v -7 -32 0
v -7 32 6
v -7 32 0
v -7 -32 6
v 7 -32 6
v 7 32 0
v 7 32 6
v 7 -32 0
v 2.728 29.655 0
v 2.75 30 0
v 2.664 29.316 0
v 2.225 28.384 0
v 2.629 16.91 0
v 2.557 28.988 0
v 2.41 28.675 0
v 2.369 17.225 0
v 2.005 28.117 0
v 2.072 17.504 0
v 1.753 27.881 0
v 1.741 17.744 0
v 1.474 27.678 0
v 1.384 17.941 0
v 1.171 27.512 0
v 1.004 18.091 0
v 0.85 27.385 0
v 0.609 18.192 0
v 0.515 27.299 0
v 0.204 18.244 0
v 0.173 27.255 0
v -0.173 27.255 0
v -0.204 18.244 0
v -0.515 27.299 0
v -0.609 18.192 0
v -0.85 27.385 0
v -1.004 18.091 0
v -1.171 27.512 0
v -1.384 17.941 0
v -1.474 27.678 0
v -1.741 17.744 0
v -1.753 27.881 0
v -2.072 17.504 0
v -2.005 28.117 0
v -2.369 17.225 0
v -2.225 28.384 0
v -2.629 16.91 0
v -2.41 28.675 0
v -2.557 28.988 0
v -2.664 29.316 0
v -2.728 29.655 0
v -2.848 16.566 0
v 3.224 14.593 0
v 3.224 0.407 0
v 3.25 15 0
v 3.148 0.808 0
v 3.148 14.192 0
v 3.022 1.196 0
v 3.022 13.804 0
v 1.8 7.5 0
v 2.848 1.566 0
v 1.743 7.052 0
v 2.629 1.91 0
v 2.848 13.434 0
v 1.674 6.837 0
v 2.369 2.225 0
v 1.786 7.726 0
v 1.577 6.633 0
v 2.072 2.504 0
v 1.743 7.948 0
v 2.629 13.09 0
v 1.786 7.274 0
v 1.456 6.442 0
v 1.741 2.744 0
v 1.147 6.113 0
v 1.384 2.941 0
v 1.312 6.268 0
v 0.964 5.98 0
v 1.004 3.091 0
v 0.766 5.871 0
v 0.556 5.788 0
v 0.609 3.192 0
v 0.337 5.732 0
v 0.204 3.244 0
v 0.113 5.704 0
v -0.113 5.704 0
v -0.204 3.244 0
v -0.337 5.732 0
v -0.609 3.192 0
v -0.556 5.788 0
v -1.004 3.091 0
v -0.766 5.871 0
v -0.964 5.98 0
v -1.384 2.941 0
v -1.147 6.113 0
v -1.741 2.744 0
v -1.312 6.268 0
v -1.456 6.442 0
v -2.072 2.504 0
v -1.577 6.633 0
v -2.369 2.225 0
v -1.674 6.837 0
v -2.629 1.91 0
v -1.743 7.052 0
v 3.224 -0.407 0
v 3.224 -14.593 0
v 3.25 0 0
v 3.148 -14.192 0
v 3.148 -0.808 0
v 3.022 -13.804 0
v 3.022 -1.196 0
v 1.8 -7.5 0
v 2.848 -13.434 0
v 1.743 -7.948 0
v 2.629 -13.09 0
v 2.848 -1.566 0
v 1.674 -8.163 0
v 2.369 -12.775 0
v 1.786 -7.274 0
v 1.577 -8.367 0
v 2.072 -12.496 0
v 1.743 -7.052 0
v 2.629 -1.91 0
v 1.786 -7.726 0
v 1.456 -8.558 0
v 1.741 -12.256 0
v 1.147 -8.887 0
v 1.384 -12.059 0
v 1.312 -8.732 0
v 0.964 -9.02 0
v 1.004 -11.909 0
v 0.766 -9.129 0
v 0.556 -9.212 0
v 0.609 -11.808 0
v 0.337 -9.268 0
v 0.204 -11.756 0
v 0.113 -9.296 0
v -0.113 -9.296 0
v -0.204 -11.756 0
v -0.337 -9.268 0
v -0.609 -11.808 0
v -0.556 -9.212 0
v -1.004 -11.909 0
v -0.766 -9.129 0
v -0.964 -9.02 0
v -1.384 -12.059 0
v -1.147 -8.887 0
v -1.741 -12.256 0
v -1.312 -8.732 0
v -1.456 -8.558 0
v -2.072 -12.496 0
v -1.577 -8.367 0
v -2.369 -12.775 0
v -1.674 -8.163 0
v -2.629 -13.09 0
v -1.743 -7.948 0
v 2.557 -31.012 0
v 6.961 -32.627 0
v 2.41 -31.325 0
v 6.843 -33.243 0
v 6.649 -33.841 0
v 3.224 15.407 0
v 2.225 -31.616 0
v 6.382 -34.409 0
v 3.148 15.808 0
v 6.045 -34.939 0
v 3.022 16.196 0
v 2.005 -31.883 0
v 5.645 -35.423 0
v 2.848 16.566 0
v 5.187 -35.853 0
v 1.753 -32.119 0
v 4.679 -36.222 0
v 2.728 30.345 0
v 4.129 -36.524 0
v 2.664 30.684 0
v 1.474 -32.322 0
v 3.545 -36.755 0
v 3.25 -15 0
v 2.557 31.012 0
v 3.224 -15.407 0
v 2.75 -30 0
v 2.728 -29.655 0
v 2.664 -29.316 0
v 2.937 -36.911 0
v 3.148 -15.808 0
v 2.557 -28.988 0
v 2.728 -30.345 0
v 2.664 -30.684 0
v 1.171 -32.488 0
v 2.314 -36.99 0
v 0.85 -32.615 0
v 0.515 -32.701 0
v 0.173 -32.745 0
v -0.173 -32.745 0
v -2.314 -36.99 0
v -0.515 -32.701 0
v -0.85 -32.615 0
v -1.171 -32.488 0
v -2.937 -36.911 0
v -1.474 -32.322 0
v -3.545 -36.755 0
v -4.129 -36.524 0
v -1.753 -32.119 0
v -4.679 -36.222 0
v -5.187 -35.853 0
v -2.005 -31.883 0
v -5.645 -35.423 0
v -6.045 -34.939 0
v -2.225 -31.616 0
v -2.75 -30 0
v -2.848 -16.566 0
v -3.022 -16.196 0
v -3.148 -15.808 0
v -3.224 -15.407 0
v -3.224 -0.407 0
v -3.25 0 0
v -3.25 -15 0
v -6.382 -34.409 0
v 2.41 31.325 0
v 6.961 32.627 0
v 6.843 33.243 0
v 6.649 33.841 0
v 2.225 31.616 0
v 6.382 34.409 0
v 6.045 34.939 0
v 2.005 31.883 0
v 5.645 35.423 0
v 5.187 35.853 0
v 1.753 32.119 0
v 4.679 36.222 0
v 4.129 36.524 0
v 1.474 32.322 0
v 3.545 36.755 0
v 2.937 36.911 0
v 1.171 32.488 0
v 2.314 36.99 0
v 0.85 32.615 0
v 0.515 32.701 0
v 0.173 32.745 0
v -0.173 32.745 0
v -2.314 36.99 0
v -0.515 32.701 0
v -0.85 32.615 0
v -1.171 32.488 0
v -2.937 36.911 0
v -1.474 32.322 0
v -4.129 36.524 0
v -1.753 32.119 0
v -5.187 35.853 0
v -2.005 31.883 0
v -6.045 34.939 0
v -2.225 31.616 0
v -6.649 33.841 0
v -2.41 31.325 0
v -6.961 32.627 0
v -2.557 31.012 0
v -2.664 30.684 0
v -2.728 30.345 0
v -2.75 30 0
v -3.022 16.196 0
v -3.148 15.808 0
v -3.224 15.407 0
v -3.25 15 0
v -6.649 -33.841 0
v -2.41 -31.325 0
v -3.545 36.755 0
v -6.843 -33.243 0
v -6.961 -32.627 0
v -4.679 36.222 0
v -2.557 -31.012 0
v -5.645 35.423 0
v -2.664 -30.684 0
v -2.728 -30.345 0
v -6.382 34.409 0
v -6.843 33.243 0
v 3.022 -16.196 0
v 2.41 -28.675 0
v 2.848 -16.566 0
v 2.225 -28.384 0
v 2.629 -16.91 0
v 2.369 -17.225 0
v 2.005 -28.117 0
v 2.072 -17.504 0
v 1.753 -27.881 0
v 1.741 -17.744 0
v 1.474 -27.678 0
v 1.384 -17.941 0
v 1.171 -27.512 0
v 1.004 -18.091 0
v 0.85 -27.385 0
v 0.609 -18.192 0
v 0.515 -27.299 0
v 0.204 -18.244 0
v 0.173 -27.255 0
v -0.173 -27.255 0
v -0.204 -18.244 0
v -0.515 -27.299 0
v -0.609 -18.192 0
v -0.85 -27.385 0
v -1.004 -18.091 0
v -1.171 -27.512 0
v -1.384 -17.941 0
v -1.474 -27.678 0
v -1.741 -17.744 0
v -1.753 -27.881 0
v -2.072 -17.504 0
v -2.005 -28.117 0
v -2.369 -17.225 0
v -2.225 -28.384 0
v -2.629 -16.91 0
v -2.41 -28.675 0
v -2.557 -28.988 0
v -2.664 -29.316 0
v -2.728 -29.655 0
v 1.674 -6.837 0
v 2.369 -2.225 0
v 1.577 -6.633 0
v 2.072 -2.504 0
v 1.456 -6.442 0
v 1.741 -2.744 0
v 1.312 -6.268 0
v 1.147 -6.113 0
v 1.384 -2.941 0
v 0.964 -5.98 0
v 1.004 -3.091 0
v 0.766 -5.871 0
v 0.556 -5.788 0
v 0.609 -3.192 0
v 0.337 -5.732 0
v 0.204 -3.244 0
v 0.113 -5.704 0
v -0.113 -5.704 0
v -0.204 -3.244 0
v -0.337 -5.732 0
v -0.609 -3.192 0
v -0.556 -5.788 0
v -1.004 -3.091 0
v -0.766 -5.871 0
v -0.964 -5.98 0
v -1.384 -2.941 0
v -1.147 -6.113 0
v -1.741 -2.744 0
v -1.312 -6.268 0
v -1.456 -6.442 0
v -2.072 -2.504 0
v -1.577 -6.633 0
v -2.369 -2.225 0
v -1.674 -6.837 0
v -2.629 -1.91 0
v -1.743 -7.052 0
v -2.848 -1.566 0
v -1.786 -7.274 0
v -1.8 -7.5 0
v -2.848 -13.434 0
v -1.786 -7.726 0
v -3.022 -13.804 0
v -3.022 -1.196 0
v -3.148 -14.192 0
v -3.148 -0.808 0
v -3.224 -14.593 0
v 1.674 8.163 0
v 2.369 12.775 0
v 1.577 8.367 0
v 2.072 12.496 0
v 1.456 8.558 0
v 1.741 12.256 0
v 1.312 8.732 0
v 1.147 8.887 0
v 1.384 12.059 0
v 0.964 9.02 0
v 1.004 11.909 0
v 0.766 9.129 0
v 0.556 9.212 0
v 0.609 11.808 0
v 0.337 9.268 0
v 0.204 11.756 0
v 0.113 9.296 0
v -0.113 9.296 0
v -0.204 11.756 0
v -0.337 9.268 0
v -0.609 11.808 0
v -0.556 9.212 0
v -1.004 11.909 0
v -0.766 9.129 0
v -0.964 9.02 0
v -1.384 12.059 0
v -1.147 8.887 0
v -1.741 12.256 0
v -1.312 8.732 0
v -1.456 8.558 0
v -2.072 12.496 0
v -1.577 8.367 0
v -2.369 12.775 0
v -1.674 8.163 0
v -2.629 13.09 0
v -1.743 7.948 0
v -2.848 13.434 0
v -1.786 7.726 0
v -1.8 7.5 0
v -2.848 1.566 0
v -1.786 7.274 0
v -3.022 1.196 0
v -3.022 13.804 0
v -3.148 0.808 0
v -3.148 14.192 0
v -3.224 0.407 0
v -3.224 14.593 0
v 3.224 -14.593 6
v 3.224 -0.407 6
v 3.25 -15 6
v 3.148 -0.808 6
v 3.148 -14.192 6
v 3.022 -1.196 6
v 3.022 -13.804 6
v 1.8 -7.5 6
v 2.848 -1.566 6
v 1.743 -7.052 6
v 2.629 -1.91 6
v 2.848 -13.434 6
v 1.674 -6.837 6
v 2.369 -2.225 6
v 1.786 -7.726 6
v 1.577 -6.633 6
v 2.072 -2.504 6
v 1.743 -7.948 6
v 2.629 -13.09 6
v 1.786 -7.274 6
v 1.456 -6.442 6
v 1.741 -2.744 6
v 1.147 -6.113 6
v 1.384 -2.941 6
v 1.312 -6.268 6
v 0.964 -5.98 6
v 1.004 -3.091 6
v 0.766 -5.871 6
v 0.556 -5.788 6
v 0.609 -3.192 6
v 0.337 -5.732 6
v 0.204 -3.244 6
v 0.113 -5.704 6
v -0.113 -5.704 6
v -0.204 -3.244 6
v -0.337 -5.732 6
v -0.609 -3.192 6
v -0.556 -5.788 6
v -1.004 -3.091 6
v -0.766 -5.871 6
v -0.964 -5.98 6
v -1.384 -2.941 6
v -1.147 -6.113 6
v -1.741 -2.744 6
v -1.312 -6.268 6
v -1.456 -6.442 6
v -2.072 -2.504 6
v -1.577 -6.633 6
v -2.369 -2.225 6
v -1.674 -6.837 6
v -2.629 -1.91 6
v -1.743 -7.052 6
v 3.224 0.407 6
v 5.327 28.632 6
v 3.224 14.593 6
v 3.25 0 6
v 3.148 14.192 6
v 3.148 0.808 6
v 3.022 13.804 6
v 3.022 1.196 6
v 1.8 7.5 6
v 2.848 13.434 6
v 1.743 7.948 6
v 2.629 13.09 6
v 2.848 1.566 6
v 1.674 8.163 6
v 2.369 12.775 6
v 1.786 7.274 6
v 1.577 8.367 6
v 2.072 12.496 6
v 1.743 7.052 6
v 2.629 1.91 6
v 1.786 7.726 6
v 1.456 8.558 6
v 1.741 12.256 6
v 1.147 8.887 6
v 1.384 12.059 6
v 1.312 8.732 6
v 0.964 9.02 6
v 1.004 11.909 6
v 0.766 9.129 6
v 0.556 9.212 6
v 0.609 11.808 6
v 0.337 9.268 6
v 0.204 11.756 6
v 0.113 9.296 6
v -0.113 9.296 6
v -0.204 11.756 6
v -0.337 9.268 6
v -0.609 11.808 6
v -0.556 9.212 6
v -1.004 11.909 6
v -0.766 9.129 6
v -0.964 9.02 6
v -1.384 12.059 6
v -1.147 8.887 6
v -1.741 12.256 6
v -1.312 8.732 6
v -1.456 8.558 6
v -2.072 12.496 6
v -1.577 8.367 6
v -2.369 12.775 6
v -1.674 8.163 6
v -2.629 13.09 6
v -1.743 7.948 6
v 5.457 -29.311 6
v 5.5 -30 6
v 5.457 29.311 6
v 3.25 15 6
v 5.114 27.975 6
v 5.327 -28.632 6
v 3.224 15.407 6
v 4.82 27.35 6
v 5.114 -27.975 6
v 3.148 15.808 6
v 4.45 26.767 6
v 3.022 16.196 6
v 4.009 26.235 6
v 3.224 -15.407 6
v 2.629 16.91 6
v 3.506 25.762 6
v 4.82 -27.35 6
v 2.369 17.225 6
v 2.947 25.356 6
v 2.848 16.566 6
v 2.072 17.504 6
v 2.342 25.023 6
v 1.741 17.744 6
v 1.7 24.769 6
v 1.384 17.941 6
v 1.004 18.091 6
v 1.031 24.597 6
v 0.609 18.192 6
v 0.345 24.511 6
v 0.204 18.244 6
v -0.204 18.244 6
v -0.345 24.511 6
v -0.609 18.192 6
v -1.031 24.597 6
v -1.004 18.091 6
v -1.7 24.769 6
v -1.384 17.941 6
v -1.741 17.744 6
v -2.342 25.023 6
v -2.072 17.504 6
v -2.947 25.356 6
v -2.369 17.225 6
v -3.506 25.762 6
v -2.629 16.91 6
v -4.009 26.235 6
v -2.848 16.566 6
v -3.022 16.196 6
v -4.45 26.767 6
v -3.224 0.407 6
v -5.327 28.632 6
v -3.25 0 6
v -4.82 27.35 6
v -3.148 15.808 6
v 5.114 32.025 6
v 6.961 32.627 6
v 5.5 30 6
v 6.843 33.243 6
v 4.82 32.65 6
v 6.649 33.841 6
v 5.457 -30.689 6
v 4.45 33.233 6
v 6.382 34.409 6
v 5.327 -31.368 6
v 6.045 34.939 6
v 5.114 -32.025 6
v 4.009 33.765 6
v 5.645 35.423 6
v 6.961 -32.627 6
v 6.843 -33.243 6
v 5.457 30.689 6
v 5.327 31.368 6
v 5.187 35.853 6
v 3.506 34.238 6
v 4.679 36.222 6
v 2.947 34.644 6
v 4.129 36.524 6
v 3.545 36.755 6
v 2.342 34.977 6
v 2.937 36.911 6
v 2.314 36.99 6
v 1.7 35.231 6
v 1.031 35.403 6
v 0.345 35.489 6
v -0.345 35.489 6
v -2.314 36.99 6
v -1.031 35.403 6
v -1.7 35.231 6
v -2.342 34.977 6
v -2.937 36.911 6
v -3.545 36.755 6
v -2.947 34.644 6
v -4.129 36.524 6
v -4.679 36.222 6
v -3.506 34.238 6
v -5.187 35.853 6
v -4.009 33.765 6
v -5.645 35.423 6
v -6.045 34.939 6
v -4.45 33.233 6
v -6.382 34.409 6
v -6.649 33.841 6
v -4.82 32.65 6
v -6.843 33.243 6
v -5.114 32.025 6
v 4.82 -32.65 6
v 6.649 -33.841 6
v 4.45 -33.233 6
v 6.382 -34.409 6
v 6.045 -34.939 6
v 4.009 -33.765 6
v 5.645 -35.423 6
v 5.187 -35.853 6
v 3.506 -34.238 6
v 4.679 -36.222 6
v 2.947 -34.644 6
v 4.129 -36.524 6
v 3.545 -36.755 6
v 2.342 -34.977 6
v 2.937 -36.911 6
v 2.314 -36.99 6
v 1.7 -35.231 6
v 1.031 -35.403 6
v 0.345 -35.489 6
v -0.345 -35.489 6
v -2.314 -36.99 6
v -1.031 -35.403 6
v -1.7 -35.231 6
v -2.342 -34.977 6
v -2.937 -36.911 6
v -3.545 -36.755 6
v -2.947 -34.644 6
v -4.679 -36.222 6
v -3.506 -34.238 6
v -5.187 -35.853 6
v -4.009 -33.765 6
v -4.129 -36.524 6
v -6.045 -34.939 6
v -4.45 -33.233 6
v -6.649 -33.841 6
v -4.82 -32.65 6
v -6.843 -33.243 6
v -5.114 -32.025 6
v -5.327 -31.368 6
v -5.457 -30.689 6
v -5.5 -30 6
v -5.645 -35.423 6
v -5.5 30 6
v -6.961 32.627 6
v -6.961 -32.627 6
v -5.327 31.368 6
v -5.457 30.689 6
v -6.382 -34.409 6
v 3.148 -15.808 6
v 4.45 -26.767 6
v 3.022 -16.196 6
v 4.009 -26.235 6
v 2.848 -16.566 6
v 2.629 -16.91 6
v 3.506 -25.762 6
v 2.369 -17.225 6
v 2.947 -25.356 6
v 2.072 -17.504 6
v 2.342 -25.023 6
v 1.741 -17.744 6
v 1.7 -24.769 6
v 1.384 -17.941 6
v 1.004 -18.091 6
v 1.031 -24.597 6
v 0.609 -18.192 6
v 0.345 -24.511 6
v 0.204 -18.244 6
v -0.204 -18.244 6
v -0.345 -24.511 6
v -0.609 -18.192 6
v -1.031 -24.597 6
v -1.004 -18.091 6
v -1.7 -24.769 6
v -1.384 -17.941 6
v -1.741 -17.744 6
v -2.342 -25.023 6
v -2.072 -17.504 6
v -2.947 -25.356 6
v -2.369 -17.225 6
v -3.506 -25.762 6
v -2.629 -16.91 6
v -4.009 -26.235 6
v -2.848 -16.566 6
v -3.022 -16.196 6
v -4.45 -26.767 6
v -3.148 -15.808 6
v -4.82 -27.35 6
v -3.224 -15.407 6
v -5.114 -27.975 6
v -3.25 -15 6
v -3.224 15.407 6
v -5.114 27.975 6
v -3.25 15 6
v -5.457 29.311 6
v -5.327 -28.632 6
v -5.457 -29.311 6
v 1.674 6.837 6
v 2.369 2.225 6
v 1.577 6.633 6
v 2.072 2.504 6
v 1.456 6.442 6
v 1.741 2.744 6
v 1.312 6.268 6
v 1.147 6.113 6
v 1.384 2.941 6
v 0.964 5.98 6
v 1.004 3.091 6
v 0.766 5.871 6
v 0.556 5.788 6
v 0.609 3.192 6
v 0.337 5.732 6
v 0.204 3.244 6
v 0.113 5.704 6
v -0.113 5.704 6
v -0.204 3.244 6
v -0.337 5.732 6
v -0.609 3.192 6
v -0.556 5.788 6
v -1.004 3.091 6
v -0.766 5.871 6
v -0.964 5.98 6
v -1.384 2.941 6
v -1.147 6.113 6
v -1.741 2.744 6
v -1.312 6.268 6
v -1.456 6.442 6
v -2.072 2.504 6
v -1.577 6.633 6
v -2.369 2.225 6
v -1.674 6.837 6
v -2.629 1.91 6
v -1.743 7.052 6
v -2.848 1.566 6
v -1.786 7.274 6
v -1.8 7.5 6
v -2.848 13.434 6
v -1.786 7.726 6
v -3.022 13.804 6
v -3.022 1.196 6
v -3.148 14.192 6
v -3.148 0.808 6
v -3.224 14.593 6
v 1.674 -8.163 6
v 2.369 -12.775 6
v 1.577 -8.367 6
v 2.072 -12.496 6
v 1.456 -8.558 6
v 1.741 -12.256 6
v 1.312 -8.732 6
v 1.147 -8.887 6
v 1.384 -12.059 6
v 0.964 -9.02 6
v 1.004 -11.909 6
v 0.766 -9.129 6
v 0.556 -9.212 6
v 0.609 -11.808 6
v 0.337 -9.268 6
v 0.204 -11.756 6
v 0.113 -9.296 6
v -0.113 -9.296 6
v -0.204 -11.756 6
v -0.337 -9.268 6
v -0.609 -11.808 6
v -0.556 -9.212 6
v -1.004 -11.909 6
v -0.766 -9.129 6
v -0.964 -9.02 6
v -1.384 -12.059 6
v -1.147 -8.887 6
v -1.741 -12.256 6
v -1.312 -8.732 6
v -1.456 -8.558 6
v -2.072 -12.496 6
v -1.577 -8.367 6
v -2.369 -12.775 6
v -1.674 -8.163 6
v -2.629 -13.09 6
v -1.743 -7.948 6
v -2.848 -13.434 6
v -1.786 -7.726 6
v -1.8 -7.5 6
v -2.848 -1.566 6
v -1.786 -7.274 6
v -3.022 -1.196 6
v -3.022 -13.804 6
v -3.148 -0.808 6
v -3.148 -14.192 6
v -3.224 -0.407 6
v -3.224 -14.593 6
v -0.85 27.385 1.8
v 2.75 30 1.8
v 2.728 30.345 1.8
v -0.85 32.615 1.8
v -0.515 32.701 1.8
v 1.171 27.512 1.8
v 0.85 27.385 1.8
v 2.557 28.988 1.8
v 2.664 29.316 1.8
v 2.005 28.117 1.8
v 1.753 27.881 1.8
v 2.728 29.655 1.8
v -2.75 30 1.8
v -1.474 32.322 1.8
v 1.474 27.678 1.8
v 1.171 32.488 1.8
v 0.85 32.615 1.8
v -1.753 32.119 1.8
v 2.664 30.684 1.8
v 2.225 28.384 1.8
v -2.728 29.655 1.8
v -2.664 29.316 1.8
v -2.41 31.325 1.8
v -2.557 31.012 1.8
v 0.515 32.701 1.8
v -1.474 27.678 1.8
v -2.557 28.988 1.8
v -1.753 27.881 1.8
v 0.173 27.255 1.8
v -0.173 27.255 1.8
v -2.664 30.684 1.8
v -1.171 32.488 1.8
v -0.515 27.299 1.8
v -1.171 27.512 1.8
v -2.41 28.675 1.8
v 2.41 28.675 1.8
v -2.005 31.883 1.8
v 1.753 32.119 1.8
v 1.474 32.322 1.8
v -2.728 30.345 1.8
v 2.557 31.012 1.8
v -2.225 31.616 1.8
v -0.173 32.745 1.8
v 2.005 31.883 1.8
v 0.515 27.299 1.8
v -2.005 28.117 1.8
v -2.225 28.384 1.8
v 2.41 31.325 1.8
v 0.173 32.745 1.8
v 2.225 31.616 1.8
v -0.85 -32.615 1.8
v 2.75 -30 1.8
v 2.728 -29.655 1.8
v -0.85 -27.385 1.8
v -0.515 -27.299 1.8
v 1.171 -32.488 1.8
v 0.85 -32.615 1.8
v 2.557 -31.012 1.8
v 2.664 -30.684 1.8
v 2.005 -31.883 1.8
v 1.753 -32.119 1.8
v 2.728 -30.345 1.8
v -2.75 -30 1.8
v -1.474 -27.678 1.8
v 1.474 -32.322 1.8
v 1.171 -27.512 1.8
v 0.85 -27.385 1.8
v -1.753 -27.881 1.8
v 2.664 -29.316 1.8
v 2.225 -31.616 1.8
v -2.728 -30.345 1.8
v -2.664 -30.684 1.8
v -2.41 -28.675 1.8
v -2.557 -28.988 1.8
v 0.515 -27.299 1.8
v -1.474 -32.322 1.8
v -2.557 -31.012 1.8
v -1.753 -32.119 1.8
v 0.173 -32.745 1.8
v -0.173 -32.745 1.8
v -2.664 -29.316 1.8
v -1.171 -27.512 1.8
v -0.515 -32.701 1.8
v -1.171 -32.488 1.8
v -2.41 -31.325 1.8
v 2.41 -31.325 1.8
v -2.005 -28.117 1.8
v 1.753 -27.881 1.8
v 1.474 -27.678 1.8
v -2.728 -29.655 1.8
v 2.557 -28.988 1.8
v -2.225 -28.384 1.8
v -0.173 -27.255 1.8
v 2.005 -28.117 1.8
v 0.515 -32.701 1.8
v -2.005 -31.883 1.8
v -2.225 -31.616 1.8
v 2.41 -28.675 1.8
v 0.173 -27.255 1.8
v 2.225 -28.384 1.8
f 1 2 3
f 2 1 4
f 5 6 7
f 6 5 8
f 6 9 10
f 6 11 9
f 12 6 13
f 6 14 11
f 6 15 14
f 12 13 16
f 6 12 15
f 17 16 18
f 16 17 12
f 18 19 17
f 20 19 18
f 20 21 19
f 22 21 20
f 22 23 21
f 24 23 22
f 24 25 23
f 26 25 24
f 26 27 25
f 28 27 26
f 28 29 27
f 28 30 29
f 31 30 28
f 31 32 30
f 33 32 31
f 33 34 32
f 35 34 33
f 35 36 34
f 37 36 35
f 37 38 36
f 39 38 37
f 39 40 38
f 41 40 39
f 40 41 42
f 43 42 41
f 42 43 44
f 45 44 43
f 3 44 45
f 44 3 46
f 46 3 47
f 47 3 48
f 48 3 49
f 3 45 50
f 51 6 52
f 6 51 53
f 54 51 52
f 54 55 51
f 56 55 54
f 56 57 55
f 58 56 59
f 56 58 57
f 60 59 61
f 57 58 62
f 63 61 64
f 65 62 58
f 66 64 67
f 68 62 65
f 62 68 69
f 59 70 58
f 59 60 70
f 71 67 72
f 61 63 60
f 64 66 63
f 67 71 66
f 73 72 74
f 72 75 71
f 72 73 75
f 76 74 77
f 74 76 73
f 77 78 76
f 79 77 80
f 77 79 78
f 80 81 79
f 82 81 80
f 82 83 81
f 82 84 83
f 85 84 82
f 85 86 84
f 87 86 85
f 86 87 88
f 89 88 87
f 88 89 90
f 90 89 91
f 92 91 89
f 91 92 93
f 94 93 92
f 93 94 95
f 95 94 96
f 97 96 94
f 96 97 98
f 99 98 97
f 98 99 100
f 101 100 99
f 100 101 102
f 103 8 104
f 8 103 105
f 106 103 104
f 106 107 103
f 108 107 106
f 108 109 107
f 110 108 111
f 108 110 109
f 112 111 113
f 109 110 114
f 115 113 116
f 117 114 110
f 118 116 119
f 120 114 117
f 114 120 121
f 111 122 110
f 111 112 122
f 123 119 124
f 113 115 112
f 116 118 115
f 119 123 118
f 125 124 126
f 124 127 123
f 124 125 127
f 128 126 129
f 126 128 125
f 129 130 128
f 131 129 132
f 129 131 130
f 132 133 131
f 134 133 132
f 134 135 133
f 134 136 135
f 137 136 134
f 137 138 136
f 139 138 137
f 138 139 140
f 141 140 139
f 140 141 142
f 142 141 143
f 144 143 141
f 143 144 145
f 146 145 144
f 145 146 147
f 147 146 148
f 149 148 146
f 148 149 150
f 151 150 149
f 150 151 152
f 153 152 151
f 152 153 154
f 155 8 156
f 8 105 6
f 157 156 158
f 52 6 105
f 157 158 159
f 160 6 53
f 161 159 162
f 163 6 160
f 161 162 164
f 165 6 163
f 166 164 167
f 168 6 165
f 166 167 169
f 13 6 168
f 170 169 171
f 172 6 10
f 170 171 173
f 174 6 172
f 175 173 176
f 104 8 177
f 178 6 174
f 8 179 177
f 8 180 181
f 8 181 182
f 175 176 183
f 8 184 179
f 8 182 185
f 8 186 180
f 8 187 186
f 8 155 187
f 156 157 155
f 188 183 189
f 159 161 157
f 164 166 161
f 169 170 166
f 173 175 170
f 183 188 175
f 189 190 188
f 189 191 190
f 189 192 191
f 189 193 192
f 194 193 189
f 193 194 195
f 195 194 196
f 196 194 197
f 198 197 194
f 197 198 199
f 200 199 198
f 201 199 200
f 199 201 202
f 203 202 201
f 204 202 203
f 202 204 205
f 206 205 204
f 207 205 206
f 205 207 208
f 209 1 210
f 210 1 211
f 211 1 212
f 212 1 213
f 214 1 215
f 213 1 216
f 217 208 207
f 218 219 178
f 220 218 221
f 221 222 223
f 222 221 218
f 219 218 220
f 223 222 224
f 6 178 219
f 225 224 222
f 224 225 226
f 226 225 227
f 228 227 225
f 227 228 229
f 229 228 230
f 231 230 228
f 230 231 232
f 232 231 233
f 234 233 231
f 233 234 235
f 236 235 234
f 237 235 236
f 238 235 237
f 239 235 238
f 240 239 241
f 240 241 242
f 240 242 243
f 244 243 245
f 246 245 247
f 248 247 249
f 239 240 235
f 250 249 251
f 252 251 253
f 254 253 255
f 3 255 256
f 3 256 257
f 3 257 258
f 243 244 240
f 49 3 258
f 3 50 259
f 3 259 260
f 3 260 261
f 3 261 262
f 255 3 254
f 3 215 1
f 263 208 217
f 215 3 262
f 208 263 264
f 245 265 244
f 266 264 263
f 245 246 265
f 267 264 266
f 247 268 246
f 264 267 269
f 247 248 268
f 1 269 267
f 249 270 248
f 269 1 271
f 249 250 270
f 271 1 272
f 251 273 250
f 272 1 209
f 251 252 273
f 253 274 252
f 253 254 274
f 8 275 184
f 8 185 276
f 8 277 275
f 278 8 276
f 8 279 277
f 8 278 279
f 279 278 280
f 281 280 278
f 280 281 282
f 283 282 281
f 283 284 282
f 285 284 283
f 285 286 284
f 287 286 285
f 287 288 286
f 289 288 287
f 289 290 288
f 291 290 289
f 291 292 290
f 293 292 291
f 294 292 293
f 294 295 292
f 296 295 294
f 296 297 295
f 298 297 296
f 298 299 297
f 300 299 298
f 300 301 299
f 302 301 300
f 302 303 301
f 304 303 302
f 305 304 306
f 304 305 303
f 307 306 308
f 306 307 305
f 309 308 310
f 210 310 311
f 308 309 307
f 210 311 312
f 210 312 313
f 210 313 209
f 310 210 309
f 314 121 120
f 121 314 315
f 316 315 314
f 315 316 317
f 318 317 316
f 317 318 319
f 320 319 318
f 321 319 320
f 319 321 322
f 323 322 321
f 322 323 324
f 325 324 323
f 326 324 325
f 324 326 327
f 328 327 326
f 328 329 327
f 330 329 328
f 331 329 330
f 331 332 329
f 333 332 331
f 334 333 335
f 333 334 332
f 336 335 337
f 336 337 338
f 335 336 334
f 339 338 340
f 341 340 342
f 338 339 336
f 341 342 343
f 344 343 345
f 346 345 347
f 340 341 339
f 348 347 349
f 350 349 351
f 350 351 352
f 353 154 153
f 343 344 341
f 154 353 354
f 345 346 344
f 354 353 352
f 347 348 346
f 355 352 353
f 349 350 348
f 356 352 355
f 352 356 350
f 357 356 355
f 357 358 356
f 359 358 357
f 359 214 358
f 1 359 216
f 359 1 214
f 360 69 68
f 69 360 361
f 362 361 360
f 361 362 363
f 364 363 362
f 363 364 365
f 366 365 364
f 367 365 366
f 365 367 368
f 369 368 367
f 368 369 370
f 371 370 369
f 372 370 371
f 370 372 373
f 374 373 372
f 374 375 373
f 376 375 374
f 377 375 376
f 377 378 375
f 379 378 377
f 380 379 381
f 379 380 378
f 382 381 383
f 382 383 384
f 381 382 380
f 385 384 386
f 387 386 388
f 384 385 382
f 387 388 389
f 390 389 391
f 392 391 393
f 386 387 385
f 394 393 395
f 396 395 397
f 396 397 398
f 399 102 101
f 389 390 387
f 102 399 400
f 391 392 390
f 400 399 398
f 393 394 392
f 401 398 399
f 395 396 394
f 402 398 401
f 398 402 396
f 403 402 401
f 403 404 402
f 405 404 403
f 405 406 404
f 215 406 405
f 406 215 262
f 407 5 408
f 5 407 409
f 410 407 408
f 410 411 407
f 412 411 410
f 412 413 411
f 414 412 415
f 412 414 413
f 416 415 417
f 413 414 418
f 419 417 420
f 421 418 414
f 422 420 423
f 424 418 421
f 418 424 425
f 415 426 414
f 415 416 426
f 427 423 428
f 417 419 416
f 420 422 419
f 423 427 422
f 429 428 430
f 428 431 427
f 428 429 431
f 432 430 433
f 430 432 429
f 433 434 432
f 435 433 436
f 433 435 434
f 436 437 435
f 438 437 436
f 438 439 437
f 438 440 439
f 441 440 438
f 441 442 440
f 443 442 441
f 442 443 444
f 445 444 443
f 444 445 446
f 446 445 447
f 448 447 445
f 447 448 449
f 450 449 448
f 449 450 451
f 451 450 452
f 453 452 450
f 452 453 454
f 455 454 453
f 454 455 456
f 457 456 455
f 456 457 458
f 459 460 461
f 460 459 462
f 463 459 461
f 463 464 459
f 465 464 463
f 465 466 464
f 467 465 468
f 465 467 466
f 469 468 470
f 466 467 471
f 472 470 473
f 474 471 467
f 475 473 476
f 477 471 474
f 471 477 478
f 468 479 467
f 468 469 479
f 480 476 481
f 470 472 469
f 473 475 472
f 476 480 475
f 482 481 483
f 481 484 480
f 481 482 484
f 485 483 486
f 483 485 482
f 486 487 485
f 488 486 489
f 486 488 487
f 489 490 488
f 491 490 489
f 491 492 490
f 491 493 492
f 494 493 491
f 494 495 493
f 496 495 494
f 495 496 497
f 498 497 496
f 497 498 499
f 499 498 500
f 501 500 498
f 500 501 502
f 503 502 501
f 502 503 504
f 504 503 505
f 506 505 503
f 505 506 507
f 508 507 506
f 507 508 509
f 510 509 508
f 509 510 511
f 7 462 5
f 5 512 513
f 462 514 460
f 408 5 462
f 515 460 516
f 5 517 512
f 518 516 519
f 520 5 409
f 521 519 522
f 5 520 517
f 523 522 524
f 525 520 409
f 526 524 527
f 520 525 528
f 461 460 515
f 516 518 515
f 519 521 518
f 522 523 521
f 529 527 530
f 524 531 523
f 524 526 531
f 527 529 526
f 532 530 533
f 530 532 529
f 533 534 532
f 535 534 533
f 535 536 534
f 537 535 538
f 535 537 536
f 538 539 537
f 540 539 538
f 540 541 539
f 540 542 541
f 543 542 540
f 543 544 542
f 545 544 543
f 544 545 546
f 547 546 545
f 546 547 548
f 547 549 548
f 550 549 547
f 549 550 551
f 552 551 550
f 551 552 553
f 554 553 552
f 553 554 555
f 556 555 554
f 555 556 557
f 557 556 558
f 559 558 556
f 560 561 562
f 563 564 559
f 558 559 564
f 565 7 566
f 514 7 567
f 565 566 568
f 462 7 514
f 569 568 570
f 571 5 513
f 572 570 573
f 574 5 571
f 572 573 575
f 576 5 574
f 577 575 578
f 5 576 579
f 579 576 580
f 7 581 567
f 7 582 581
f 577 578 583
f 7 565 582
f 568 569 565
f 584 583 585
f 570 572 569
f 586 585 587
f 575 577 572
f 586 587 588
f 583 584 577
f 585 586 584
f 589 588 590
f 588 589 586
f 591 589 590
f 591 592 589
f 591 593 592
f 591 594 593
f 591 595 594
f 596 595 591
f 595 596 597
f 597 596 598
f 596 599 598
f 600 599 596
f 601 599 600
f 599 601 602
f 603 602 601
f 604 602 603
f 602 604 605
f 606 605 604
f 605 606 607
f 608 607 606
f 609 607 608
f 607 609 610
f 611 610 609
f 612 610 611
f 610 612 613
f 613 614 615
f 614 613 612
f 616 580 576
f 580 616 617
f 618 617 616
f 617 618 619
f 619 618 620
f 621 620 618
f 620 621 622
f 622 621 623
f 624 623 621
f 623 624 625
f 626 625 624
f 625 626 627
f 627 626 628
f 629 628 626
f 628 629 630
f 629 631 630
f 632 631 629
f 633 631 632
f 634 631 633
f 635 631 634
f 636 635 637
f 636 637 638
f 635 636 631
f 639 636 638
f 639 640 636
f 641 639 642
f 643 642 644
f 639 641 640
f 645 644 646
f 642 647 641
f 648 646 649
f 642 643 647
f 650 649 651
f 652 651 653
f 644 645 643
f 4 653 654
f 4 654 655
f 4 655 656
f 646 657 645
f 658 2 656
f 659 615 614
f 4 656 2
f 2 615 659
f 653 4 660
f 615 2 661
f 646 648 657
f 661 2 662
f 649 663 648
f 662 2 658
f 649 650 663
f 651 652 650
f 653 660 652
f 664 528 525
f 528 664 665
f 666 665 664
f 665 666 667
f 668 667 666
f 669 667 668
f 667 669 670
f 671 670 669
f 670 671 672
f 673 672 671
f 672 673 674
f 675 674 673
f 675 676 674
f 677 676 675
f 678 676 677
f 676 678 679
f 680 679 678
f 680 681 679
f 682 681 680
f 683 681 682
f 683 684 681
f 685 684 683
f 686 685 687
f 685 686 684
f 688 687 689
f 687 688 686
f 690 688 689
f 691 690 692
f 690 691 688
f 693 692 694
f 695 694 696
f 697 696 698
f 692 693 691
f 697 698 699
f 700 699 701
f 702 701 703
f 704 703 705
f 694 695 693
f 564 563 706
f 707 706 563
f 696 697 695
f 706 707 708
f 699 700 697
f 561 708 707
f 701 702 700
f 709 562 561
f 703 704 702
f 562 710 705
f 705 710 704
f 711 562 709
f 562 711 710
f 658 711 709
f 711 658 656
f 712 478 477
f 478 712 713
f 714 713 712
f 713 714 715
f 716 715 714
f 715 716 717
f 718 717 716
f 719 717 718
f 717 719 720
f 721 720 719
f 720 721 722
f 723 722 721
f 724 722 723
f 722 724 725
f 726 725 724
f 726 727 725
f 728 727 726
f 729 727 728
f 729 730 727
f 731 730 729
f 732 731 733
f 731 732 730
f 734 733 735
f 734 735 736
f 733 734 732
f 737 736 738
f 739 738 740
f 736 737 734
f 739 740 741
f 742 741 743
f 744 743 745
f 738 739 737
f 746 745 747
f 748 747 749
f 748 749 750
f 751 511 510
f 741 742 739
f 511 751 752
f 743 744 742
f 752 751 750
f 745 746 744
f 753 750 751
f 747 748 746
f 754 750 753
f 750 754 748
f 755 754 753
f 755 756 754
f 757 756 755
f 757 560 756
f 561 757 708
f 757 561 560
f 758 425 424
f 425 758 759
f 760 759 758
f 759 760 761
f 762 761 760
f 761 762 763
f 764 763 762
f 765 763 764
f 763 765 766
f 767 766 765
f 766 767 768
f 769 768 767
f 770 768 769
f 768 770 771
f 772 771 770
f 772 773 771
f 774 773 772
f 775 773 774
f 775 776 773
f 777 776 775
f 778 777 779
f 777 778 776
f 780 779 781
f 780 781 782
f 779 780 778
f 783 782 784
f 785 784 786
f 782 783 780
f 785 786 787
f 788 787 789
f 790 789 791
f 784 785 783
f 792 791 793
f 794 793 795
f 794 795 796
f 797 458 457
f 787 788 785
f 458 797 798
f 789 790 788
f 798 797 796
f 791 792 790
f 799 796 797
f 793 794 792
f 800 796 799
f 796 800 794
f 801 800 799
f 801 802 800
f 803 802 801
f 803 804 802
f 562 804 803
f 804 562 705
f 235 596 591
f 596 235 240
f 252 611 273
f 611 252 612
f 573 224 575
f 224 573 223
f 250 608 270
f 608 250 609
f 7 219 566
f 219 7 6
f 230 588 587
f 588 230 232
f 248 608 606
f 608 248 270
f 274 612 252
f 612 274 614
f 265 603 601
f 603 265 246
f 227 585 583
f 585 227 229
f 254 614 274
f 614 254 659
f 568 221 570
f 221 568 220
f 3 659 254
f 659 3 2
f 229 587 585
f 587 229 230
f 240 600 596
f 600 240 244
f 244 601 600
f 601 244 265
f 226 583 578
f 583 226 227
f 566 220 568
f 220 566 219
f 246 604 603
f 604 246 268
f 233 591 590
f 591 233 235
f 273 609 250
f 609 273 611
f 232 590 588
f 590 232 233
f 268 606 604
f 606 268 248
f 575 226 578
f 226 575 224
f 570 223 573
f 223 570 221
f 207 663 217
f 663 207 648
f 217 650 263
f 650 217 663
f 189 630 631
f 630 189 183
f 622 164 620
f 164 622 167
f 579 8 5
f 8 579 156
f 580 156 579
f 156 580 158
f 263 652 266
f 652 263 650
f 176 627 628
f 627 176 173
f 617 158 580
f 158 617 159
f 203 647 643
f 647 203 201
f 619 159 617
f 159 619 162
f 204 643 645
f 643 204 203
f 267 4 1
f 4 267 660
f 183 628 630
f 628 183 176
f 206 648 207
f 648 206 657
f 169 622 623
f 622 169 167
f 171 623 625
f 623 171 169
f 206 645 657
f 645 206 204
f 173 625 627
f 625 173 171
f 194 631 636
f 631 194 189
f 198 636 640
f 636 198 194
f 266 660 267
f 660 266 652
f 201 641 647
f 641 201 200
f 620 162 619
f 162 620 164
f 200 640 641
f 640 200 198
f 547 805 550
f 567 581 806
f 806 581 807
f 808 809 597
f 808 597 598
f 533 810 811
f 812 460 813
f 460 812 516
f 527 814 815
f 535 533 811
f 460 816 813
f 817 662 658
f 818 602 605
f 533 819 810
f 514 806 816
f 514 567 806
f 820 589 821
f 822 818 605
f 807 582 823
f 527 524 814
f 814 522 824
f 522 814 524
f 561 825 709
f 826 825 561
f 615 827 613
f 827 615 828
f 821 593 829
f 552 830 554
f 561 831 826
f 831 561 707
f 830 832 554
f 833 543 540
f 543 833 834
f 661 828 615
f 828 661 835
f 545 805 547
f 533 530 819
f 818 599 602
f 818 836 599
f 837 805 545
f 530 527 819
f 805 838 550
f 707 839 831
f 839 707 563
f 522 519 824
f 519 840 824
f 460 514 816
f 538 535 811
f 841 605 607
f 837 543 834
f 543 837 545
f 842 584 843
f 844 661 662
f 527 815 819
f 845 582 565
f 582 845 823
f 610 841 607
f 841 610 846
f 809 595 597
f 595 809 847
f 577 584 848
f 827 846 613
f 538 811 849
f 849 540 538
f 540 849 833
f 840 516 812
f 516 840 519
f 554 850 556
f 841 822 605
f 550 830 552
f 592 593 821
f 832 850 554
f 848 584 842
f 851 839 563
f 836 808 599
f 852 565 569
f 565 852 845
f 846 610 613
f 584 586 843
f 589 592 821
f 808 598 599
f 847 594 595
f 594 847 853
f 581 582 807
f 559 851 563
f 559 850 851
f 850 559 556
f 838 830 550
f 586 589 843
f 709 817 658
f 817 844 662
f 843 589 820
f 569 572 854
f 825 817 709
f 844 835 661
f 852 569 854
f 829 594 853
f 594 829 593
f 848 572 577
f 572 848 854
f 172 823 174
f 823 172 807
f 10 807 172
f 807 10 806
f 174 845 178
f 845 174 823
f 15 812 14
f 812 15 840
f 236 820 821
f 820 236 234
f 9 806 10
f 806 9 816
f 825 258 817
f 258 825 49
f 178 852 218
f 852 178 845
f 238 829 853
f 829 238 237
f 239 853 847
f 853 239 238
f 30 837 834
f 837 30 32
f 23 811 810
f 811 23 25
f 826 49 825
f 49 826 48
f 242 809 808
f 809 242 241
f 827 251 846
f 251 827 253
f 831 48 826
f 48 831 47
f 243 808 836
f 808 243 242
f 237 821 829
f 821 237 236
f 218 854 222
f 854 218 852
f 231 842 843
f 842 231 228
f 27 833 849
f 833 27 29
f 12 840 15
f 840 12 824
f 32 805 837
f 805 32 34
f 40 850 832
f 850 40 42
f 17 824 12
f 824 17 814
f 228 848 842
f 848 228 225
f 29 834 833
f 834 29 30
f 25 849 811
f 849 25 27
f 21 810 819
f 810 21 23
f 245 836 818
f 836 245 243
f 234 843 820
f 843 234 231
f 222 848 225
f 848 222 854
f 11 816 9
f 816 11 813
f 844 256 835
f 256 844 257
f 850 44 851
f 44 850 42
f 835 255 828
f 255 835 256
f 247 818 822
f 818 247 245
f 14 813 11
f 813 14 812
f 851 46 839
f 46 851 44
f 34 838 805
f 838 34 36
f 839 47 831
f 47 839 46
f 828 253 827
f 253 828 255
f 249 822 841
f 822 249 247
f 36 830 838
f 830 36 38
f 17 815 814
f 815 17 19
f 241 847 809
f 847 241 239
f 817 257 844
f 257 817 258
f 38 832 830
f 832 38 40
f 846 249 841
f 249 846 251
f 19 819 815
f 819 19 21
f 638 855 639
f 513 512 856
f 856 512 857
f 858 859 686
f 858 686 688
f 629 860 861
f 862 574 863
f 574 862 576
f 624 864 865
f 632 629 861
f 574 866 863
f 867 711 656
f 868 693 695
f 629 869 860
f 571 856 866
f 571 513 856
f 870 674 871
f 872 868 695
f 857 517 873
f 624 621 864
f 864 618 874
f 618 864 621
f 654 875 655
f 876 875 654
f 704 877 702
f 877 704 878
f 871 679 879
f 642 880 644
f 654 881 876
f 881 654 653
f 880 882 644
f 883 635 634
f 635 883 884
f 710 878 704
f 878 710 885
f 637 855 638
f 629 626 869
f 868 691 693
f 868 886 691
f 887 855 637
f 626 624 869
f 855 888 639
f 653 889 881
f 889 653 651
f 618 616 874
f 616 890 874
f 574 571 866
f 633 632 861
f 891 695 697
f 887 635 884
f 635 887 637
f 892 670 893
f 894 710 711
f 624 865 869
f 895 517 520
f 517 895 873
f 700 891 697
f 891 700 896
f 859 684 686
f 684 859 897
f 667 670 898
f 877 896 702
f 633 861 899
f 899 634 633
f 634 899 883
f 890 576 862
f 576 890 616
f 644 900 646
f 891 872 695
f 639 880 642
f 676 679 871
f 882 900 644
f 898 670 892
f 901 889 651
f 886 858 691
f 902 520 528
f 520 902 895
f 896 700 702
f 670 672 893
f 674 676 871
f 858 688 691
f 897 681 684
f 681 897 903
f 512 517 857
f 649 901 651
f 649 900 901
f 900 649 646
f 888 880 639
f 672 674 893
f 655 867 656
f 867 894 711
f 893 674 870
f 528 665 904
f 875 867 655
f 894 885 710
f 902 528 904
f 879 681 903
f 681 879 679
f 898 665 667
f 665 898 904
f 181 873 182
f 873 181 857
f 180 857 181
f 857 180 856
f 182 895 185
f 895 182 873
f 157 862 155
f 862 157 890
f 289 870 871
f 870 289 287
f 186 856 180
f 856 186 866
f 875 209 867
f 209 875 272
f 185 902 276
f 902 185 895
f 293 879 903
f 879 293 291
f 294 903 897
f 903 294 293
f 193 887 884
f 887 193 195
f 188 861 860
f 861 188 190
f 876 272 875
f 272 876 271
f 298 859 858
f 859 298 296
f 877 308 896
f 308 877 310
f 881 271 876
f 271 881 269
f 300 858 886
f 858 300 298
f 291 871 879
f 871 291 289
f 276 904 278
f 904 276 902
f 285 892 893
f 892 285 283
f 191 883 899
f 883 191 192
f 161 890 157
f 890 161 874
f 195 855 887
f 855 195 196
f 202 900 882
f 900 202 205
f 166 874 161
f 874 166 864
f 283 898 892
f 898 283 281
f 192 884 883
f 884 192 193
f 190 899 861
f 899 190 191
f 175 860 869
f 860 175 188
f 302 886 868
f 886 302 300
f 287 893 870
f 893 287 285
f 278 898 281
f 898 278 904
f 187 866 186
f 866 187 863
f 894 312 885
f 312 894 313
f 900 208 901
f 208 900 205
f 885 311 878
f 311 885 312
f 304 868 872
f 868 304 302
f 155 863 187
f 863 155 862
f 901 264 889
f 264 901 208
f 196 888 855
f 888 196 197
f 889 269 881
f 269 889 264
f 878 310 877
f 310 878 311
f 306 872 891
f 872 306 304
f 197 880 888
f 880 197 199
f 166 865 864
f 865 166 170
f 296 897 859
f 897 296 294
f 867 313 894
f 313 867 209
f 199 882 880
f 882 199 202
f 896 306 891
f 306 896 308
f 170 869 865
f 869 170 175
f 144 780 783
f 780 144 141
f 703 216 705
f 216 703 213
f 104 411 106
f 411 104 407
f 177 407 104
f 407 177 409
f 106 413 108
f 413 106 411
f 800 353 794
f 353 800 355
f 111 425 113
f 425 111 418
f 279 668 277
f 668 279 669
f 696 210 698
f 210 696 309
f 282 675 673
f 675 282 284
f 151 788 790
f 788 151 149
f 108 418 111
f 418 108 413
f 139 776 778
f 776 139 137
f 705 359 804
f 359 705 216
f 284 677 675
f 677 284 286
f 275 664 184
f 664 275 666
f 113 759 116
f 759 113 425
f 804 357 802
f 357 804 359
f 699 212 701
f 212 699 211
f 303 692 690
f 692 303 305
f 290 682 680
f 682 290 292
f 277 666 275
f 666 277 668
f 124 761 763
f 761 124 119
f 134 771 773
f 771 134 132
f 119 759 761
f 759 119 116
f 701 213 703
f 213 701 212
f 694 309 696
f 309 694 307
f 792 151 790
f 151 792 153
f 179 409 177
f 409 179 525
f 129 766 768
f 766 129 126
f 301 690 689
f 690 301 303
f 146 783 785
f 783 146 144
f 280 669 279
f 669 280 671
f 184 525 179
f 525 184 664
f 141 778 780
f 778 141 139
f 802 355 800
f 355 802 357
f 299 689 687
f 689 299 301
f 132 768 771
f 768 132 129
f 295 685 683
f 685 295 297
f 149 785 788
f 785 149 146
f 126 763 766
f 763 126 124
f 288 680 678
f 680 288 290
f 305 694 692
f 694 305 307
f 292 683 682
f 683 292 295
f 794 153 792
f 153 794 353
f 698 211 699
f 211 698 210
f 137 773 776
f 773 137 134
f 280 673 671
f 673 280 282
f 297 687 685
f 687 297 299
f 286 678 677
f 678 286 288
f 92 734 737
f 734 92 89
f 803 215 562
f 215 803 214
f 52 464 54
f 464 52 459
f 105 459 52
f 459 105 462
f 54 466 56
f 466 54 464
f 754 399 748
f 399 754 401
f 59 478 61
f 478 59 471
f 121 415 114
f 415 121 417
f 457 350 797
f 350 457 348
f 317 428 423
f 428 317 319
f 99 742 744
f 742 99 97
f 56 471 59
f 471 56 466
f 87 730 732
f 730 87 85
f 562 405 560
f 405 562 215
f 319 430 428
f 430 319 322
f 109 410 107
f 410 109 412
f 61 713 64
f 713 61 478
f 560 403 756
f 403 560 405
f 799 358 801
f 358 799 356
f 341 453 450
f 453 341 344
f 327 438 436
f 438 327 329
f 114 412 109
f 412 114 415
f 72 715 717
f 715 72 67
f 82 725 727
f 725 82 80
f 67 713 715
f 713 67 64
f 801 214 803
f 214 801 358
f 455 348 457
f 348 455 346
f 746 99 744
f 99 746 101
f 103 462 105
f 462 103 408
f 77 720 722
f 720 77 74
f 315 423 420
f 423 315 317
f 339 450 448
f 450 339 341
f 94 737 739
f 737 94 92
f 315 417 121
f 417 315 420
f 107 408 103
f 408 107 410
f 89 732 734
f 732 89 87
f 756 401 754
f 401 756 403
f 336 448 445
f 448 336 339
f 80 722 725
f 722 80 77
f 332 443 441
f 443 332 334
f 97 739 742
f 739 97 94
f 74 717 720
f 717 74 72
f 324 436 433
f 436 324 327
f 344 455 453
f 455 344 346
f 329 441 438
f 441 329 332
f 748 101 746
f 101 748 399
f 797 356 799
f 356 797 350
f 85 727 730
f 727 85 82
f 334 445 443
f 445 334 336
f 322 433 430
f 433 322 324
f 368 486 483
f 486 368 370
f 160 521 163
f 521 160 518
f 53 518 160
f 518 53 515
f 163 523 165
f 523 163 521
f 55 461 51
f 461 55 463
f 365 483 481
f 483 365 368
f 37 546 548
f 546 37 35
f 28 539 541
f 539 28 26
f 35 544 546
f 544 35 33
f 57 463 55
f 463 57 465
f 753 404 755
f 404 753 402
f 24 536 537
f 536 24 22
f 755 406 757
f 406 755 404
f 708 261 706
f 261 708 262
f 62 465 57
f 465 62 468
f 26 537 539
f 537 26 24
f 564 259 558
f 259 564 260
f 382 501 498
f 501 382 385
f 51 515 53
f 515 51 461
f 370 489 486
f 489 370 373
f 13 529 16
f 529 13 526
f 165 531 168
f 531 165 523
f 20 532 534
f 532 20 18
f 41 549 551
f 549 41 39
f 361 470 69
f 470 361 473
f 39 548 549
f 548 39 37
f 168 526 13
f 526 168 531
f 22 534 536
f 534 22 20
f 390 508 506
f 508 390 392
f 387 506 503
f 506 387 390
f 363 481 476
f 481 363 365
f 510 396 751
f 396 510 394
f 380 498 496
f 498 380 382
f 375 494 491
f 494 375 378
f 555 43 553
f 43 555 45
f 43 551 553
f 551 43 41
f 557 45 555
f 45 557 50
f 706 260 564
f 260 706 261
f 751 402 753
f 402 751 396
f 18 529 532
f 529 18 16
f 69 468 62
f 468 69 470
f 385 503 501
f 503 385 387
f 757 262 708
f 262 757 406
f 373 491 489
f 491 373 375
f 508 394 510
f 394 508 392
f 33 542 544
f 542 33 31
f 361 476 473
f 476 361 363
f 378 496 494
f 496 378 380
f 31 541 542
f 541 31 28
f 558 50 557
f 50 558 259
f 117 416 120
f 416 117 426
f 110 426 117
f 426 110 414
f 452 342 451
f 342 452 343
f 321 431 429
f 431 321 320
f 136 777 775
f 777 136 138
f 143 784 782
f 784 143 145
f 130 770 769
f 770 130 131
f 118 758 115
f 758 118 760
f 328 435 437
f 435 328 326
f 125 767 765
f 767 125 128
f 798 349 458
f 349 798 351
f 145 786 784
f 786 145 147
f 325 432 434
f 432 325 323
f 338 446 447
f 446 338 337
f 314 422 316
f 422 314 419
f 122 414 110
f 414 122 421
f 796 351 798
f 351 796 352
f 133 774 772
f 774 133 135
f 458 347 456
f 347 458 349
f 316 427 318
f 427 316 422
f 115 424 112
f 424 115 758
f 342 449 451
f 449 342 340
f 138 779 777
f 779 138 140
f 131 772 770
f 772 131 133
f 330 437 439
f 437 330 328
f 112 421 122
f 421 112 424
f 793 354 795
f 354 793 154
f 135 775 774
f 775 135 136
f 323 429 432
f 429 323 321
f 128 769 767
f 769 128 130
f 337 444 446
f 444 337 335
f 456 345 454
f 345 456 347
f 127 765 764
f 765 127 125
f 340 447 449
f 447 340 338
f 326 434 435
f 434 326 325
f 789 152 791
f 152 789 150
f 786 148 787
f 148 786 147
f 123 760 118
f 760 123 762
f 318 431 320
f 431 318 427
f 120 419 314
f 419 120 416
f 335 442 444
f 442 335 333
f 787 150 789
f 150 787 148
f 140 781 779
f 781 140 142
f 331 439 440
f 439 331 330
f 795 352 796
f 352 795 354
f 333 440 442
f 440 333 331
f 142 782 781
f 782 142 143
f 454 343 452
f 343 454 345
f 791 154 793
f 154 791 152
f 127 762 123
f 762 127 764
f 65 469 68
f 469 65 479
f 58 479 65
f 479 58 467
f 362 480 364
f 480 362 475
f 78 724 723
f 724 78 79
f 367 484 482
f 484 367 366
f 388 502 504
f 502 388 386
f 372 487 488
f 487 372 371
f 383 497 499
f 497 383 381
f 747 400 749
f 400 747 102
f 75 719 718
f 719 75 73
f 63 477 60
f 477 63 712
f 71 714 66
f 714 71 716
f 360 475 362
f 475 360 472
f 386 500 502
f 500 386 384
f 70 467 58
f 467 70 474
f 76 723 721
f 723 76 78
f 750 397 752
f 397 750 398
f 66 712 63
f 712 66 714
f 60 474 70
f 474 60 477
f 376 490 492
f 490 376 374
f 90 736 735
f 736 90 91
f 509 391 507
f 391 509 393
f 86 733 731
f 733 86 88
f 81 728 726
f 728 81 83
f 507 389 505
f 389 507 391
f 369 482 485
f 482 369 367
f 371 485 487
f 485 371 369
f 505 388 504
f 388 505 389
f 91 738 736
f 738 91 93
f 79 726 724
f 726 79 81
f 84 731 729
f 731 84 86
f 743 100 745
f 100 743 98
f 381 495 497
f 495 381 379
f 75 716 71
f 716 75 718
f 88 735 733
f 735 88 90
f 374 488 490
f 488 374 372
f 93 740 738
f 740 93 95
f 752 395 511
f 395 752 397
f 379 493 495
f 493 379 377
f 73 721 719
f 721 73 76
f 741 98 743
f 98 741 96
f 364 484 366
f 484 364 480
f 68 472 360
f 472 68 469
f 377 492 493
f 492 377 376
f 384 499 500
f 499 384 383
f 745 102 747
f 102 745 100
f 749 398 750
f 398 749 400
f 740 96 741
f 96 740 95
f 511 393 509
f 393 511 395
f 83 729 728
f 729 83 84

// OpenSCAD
$fn = 50;


difference() {
	union() {
		hull() {
			translate(v = [-2.0000000000, 17.0000000000, 0]) {
				cylinder(h = 6, r = 5);
			}
			translate(v = [2.0000000000, 17.0000000000, 0]) {
				cylinder(h = 6, r = 5);
			}
			translate(v = [-2.0000000000, -17.0000000000, 0]) {
				cylinder(h = 6, r = 5);
			}
			translate(v = [2.0000000000, -17.0000000000, 0]) {
				cylinder(h = 6, r = 5);
			}
		}
		translate(v = [0.0000000000, 22.5000000000, 0]) {
			hull() {
				translate(v = [-2.0000000000, 9.5000000000, 0]) {
					cylinder(h = 6, r = 5);
				}
				translate(v = [2.0000000000, 9.5000000000, 0]) {
					cylinder(h = 6, r = 5);
				}
				translate(v = [-2.0000000000, -9.5000000000, 0]) {
					cylinder(h = 6, r = 5);
				}
				translate(v = [2.0000000000, -9.5000000000, 0]) {
					cylinder(h = 6, r = 5);
				}
			}
		}
		translate(v = [0.0000000000, 22.5000000000, 0]) {
			hull() {
				translate(v = [-2.0000000000, 9.5000000000, 0]) {
					cylinder(h = 6, r = 5);
				}
				translate(v = [2.0000000000, 9.5000000000, 0]) {
					cylinder(h = 6, r = 5);
				}
				translate(v = [-2.0000000000, -9.5000000000, 0]) {
					cylinder(h = 6, r = 5);
				}
				translate(v = [2.0000000000, -9.5000000000, 0]) {
					cylinder(h = 6, r = 5);
				}
			}
		}
		translate(v = [0.0000000000, -22.5000000000, 0]) {
			hull() {
				translate(v = [-2.0000000000, 9.5000000000, 0]) {
					cylinder(h = 6, r = 5);
				}
				translate(v = [2.0000000000, 9.5000000000, 0]) {
					cylinder(h = 6, r = 5);
				}
				translate(v = [-2.0000000000, -9.5000000000, 0]) {
					cylinder(h = 6, r = 5);
				}
				translate(v = [2.0000000000, -9.5000000000, 0]) {
					cylinder(h = 6, r = 5);
				}
			}
		}
		translate(v = [0.0000000000, -22.5000000000, 0]) {
			hull() {
				translate(v = [-2.0000000000, 9.5000000000, 0]) {
					cylinder(h = 6, r = 5);
				}
				translate(v = [2.0000000000, 9.5000000000, 0]) {
					cylinder(h = 6, r = 5);
				}
				translate(v = [-2.0000000000, -9.5000000000, 0]) {
					cylinder(h = 6, r = 5);
				}
				translate(v = [2.0000000000, -9.5000000000, 0]) {
					cylinder(h = 6, r = 5);
				}
			}
		}
	}
	union() {
		translate(v = [0.0000000000, 30.0000000000, 6]) {
			rotate(a = [0, 0, 0]) {
				difference() {
					union() {
						#translate(v = [0, 0, -6.0000000000]) {
							cylinder(h = 6, r = 2.2500000000);
						}
						#translate(v = [0, 0, -4.2000000000]) {
							cylinder(h = 4.2000000000, r1 = 2.7500000000, r2 = 5.5000000000);
						}
						#translate(v = [0, 0, -6.0000000000]) {
							cylinder(h = 6, r = 2.7500000000);
						}
						#translate(v = [0, 0, -6.0000000000]) {
							cylinder(h = 6, r = 2.2500000000);
						}
					}
					union();
				}
			}
		}
		translate(v = [0.0000000000, 30.0000000000, 6]) {
			rotate(a = [0, 0, 0]) {
				difference() {
					union() {
						#translate(v = [0, 0, -6.0000000000]) {
							cylinder(h = 6, r = 2.2500000000);
						}
						#translate(v = [0, 0, -4.2000000000]) {
							cylinder(h = 4.2000000000, r1 = 2.7500000000, r2 = 5.5000000000);
						}
						#translate(v = [0, 0, -6.0000000000]) {
							cylinder(h = 6, r = 2.7500000000);
						}
						#translate(v = [0, 0, -6.0000000000]) {
							cylinder(h = 6, r = 2.2500000000);
						}
					}
					union();
				}
			}
		}
		translate(v = [0.0000000000, -30.0000000000, 6]) {
			rotate(a = [0, 0, 0]) {
				difference() {
					union() {
						#translate(v = [0, 0, -6.0000000000]) {
							cylinder(h = 6, r = 2.2500000000);
						}
						#translate(v = [0, 0, -4.2000000000]) {
							cylinder(h = 4.2000000000, r1 = 2.7500000000, r2 = 5.5000000000);
						}
						#translate(v = [0, 0, -6.0000000000]) {
							cylinder(h = 6, r = 2.7500000000);
						}
						#translate(v = [0, 0, -6.0000000000]) {
							cylinder(h = 6, r = 2.2500000000);
						}
					}
					union();
				}
			}
		}
		translate(v = [0.0000000000, -30.0000000000, 6]) {
			rotate(a = [0, 0, 0]) {
				difference() {
					union() {
						#translate(v = [0, 0, -6.0000000000]) {
							cylinder(h = 6, r = 2.2500000000);
						}
						#translate(v = [0, 0, -4.2000000000]) {
							cylinder(h = 4.2000000000, r1 = 2.7500000000, r2 = 5.5000000000);
						}
						#translate(v = [0, 0, -6.0000000000]) {
							cylinder(h = 6, r = 2.7500000000);
						}
						#translate(v = [0, 0, -6.0000000000]) {
							cylinder(h = 6, r = 2.2500000000);
						}
					}
					union();
				}
			}
		}
		translate(v = [0.0000000000, -15.0000000000, 0]) {
			translate(v = [0, 0, -100]) {
				cylinder(h = 200, r = 3.2500000000);
			}
		}
		translate(v = [0, 0, -100]) {
			cylinder(h = 200, r = 3.2500000000);
		}
		translate(v = [0.0000000000, 15.0000000000, 0]) {
			translate(v = [0, 0, -100]) {
				cylinder(h = 200, r = 3.2500000000);
			}
		}
		translate(v = [0.0000000000, -15.0000000000, 0]) {
			translate(v = [0, 0, -100]) {
				cylinder(h = 200, r = 1.8000000000);
			}
		}
		translate(v = [0.0000000000, -7.5000000000, 0]) {
			translate(v = [0, 0, -100]) {
				cylinder(h = 200, r = 1.8000000000);
			}
		}
		translate(v = [0, 0, -100]) {
			cylinder(h = 200, r = 1.8000000000);
		}
		translate(v = [0.0000000000, 7.5000000000, 0]) {
			translate(v = [0, 0, -100]) {
				cylinder(h = 200, r = 1.8000000000);
			}
		}
		translate(v = [0.0000000000, 15.0000000000, 0]) {
			translate(v = [0, 0, -100]) {
				cylinder(h = 200, r = 1.8000000000);
			}
		}
	}
}
